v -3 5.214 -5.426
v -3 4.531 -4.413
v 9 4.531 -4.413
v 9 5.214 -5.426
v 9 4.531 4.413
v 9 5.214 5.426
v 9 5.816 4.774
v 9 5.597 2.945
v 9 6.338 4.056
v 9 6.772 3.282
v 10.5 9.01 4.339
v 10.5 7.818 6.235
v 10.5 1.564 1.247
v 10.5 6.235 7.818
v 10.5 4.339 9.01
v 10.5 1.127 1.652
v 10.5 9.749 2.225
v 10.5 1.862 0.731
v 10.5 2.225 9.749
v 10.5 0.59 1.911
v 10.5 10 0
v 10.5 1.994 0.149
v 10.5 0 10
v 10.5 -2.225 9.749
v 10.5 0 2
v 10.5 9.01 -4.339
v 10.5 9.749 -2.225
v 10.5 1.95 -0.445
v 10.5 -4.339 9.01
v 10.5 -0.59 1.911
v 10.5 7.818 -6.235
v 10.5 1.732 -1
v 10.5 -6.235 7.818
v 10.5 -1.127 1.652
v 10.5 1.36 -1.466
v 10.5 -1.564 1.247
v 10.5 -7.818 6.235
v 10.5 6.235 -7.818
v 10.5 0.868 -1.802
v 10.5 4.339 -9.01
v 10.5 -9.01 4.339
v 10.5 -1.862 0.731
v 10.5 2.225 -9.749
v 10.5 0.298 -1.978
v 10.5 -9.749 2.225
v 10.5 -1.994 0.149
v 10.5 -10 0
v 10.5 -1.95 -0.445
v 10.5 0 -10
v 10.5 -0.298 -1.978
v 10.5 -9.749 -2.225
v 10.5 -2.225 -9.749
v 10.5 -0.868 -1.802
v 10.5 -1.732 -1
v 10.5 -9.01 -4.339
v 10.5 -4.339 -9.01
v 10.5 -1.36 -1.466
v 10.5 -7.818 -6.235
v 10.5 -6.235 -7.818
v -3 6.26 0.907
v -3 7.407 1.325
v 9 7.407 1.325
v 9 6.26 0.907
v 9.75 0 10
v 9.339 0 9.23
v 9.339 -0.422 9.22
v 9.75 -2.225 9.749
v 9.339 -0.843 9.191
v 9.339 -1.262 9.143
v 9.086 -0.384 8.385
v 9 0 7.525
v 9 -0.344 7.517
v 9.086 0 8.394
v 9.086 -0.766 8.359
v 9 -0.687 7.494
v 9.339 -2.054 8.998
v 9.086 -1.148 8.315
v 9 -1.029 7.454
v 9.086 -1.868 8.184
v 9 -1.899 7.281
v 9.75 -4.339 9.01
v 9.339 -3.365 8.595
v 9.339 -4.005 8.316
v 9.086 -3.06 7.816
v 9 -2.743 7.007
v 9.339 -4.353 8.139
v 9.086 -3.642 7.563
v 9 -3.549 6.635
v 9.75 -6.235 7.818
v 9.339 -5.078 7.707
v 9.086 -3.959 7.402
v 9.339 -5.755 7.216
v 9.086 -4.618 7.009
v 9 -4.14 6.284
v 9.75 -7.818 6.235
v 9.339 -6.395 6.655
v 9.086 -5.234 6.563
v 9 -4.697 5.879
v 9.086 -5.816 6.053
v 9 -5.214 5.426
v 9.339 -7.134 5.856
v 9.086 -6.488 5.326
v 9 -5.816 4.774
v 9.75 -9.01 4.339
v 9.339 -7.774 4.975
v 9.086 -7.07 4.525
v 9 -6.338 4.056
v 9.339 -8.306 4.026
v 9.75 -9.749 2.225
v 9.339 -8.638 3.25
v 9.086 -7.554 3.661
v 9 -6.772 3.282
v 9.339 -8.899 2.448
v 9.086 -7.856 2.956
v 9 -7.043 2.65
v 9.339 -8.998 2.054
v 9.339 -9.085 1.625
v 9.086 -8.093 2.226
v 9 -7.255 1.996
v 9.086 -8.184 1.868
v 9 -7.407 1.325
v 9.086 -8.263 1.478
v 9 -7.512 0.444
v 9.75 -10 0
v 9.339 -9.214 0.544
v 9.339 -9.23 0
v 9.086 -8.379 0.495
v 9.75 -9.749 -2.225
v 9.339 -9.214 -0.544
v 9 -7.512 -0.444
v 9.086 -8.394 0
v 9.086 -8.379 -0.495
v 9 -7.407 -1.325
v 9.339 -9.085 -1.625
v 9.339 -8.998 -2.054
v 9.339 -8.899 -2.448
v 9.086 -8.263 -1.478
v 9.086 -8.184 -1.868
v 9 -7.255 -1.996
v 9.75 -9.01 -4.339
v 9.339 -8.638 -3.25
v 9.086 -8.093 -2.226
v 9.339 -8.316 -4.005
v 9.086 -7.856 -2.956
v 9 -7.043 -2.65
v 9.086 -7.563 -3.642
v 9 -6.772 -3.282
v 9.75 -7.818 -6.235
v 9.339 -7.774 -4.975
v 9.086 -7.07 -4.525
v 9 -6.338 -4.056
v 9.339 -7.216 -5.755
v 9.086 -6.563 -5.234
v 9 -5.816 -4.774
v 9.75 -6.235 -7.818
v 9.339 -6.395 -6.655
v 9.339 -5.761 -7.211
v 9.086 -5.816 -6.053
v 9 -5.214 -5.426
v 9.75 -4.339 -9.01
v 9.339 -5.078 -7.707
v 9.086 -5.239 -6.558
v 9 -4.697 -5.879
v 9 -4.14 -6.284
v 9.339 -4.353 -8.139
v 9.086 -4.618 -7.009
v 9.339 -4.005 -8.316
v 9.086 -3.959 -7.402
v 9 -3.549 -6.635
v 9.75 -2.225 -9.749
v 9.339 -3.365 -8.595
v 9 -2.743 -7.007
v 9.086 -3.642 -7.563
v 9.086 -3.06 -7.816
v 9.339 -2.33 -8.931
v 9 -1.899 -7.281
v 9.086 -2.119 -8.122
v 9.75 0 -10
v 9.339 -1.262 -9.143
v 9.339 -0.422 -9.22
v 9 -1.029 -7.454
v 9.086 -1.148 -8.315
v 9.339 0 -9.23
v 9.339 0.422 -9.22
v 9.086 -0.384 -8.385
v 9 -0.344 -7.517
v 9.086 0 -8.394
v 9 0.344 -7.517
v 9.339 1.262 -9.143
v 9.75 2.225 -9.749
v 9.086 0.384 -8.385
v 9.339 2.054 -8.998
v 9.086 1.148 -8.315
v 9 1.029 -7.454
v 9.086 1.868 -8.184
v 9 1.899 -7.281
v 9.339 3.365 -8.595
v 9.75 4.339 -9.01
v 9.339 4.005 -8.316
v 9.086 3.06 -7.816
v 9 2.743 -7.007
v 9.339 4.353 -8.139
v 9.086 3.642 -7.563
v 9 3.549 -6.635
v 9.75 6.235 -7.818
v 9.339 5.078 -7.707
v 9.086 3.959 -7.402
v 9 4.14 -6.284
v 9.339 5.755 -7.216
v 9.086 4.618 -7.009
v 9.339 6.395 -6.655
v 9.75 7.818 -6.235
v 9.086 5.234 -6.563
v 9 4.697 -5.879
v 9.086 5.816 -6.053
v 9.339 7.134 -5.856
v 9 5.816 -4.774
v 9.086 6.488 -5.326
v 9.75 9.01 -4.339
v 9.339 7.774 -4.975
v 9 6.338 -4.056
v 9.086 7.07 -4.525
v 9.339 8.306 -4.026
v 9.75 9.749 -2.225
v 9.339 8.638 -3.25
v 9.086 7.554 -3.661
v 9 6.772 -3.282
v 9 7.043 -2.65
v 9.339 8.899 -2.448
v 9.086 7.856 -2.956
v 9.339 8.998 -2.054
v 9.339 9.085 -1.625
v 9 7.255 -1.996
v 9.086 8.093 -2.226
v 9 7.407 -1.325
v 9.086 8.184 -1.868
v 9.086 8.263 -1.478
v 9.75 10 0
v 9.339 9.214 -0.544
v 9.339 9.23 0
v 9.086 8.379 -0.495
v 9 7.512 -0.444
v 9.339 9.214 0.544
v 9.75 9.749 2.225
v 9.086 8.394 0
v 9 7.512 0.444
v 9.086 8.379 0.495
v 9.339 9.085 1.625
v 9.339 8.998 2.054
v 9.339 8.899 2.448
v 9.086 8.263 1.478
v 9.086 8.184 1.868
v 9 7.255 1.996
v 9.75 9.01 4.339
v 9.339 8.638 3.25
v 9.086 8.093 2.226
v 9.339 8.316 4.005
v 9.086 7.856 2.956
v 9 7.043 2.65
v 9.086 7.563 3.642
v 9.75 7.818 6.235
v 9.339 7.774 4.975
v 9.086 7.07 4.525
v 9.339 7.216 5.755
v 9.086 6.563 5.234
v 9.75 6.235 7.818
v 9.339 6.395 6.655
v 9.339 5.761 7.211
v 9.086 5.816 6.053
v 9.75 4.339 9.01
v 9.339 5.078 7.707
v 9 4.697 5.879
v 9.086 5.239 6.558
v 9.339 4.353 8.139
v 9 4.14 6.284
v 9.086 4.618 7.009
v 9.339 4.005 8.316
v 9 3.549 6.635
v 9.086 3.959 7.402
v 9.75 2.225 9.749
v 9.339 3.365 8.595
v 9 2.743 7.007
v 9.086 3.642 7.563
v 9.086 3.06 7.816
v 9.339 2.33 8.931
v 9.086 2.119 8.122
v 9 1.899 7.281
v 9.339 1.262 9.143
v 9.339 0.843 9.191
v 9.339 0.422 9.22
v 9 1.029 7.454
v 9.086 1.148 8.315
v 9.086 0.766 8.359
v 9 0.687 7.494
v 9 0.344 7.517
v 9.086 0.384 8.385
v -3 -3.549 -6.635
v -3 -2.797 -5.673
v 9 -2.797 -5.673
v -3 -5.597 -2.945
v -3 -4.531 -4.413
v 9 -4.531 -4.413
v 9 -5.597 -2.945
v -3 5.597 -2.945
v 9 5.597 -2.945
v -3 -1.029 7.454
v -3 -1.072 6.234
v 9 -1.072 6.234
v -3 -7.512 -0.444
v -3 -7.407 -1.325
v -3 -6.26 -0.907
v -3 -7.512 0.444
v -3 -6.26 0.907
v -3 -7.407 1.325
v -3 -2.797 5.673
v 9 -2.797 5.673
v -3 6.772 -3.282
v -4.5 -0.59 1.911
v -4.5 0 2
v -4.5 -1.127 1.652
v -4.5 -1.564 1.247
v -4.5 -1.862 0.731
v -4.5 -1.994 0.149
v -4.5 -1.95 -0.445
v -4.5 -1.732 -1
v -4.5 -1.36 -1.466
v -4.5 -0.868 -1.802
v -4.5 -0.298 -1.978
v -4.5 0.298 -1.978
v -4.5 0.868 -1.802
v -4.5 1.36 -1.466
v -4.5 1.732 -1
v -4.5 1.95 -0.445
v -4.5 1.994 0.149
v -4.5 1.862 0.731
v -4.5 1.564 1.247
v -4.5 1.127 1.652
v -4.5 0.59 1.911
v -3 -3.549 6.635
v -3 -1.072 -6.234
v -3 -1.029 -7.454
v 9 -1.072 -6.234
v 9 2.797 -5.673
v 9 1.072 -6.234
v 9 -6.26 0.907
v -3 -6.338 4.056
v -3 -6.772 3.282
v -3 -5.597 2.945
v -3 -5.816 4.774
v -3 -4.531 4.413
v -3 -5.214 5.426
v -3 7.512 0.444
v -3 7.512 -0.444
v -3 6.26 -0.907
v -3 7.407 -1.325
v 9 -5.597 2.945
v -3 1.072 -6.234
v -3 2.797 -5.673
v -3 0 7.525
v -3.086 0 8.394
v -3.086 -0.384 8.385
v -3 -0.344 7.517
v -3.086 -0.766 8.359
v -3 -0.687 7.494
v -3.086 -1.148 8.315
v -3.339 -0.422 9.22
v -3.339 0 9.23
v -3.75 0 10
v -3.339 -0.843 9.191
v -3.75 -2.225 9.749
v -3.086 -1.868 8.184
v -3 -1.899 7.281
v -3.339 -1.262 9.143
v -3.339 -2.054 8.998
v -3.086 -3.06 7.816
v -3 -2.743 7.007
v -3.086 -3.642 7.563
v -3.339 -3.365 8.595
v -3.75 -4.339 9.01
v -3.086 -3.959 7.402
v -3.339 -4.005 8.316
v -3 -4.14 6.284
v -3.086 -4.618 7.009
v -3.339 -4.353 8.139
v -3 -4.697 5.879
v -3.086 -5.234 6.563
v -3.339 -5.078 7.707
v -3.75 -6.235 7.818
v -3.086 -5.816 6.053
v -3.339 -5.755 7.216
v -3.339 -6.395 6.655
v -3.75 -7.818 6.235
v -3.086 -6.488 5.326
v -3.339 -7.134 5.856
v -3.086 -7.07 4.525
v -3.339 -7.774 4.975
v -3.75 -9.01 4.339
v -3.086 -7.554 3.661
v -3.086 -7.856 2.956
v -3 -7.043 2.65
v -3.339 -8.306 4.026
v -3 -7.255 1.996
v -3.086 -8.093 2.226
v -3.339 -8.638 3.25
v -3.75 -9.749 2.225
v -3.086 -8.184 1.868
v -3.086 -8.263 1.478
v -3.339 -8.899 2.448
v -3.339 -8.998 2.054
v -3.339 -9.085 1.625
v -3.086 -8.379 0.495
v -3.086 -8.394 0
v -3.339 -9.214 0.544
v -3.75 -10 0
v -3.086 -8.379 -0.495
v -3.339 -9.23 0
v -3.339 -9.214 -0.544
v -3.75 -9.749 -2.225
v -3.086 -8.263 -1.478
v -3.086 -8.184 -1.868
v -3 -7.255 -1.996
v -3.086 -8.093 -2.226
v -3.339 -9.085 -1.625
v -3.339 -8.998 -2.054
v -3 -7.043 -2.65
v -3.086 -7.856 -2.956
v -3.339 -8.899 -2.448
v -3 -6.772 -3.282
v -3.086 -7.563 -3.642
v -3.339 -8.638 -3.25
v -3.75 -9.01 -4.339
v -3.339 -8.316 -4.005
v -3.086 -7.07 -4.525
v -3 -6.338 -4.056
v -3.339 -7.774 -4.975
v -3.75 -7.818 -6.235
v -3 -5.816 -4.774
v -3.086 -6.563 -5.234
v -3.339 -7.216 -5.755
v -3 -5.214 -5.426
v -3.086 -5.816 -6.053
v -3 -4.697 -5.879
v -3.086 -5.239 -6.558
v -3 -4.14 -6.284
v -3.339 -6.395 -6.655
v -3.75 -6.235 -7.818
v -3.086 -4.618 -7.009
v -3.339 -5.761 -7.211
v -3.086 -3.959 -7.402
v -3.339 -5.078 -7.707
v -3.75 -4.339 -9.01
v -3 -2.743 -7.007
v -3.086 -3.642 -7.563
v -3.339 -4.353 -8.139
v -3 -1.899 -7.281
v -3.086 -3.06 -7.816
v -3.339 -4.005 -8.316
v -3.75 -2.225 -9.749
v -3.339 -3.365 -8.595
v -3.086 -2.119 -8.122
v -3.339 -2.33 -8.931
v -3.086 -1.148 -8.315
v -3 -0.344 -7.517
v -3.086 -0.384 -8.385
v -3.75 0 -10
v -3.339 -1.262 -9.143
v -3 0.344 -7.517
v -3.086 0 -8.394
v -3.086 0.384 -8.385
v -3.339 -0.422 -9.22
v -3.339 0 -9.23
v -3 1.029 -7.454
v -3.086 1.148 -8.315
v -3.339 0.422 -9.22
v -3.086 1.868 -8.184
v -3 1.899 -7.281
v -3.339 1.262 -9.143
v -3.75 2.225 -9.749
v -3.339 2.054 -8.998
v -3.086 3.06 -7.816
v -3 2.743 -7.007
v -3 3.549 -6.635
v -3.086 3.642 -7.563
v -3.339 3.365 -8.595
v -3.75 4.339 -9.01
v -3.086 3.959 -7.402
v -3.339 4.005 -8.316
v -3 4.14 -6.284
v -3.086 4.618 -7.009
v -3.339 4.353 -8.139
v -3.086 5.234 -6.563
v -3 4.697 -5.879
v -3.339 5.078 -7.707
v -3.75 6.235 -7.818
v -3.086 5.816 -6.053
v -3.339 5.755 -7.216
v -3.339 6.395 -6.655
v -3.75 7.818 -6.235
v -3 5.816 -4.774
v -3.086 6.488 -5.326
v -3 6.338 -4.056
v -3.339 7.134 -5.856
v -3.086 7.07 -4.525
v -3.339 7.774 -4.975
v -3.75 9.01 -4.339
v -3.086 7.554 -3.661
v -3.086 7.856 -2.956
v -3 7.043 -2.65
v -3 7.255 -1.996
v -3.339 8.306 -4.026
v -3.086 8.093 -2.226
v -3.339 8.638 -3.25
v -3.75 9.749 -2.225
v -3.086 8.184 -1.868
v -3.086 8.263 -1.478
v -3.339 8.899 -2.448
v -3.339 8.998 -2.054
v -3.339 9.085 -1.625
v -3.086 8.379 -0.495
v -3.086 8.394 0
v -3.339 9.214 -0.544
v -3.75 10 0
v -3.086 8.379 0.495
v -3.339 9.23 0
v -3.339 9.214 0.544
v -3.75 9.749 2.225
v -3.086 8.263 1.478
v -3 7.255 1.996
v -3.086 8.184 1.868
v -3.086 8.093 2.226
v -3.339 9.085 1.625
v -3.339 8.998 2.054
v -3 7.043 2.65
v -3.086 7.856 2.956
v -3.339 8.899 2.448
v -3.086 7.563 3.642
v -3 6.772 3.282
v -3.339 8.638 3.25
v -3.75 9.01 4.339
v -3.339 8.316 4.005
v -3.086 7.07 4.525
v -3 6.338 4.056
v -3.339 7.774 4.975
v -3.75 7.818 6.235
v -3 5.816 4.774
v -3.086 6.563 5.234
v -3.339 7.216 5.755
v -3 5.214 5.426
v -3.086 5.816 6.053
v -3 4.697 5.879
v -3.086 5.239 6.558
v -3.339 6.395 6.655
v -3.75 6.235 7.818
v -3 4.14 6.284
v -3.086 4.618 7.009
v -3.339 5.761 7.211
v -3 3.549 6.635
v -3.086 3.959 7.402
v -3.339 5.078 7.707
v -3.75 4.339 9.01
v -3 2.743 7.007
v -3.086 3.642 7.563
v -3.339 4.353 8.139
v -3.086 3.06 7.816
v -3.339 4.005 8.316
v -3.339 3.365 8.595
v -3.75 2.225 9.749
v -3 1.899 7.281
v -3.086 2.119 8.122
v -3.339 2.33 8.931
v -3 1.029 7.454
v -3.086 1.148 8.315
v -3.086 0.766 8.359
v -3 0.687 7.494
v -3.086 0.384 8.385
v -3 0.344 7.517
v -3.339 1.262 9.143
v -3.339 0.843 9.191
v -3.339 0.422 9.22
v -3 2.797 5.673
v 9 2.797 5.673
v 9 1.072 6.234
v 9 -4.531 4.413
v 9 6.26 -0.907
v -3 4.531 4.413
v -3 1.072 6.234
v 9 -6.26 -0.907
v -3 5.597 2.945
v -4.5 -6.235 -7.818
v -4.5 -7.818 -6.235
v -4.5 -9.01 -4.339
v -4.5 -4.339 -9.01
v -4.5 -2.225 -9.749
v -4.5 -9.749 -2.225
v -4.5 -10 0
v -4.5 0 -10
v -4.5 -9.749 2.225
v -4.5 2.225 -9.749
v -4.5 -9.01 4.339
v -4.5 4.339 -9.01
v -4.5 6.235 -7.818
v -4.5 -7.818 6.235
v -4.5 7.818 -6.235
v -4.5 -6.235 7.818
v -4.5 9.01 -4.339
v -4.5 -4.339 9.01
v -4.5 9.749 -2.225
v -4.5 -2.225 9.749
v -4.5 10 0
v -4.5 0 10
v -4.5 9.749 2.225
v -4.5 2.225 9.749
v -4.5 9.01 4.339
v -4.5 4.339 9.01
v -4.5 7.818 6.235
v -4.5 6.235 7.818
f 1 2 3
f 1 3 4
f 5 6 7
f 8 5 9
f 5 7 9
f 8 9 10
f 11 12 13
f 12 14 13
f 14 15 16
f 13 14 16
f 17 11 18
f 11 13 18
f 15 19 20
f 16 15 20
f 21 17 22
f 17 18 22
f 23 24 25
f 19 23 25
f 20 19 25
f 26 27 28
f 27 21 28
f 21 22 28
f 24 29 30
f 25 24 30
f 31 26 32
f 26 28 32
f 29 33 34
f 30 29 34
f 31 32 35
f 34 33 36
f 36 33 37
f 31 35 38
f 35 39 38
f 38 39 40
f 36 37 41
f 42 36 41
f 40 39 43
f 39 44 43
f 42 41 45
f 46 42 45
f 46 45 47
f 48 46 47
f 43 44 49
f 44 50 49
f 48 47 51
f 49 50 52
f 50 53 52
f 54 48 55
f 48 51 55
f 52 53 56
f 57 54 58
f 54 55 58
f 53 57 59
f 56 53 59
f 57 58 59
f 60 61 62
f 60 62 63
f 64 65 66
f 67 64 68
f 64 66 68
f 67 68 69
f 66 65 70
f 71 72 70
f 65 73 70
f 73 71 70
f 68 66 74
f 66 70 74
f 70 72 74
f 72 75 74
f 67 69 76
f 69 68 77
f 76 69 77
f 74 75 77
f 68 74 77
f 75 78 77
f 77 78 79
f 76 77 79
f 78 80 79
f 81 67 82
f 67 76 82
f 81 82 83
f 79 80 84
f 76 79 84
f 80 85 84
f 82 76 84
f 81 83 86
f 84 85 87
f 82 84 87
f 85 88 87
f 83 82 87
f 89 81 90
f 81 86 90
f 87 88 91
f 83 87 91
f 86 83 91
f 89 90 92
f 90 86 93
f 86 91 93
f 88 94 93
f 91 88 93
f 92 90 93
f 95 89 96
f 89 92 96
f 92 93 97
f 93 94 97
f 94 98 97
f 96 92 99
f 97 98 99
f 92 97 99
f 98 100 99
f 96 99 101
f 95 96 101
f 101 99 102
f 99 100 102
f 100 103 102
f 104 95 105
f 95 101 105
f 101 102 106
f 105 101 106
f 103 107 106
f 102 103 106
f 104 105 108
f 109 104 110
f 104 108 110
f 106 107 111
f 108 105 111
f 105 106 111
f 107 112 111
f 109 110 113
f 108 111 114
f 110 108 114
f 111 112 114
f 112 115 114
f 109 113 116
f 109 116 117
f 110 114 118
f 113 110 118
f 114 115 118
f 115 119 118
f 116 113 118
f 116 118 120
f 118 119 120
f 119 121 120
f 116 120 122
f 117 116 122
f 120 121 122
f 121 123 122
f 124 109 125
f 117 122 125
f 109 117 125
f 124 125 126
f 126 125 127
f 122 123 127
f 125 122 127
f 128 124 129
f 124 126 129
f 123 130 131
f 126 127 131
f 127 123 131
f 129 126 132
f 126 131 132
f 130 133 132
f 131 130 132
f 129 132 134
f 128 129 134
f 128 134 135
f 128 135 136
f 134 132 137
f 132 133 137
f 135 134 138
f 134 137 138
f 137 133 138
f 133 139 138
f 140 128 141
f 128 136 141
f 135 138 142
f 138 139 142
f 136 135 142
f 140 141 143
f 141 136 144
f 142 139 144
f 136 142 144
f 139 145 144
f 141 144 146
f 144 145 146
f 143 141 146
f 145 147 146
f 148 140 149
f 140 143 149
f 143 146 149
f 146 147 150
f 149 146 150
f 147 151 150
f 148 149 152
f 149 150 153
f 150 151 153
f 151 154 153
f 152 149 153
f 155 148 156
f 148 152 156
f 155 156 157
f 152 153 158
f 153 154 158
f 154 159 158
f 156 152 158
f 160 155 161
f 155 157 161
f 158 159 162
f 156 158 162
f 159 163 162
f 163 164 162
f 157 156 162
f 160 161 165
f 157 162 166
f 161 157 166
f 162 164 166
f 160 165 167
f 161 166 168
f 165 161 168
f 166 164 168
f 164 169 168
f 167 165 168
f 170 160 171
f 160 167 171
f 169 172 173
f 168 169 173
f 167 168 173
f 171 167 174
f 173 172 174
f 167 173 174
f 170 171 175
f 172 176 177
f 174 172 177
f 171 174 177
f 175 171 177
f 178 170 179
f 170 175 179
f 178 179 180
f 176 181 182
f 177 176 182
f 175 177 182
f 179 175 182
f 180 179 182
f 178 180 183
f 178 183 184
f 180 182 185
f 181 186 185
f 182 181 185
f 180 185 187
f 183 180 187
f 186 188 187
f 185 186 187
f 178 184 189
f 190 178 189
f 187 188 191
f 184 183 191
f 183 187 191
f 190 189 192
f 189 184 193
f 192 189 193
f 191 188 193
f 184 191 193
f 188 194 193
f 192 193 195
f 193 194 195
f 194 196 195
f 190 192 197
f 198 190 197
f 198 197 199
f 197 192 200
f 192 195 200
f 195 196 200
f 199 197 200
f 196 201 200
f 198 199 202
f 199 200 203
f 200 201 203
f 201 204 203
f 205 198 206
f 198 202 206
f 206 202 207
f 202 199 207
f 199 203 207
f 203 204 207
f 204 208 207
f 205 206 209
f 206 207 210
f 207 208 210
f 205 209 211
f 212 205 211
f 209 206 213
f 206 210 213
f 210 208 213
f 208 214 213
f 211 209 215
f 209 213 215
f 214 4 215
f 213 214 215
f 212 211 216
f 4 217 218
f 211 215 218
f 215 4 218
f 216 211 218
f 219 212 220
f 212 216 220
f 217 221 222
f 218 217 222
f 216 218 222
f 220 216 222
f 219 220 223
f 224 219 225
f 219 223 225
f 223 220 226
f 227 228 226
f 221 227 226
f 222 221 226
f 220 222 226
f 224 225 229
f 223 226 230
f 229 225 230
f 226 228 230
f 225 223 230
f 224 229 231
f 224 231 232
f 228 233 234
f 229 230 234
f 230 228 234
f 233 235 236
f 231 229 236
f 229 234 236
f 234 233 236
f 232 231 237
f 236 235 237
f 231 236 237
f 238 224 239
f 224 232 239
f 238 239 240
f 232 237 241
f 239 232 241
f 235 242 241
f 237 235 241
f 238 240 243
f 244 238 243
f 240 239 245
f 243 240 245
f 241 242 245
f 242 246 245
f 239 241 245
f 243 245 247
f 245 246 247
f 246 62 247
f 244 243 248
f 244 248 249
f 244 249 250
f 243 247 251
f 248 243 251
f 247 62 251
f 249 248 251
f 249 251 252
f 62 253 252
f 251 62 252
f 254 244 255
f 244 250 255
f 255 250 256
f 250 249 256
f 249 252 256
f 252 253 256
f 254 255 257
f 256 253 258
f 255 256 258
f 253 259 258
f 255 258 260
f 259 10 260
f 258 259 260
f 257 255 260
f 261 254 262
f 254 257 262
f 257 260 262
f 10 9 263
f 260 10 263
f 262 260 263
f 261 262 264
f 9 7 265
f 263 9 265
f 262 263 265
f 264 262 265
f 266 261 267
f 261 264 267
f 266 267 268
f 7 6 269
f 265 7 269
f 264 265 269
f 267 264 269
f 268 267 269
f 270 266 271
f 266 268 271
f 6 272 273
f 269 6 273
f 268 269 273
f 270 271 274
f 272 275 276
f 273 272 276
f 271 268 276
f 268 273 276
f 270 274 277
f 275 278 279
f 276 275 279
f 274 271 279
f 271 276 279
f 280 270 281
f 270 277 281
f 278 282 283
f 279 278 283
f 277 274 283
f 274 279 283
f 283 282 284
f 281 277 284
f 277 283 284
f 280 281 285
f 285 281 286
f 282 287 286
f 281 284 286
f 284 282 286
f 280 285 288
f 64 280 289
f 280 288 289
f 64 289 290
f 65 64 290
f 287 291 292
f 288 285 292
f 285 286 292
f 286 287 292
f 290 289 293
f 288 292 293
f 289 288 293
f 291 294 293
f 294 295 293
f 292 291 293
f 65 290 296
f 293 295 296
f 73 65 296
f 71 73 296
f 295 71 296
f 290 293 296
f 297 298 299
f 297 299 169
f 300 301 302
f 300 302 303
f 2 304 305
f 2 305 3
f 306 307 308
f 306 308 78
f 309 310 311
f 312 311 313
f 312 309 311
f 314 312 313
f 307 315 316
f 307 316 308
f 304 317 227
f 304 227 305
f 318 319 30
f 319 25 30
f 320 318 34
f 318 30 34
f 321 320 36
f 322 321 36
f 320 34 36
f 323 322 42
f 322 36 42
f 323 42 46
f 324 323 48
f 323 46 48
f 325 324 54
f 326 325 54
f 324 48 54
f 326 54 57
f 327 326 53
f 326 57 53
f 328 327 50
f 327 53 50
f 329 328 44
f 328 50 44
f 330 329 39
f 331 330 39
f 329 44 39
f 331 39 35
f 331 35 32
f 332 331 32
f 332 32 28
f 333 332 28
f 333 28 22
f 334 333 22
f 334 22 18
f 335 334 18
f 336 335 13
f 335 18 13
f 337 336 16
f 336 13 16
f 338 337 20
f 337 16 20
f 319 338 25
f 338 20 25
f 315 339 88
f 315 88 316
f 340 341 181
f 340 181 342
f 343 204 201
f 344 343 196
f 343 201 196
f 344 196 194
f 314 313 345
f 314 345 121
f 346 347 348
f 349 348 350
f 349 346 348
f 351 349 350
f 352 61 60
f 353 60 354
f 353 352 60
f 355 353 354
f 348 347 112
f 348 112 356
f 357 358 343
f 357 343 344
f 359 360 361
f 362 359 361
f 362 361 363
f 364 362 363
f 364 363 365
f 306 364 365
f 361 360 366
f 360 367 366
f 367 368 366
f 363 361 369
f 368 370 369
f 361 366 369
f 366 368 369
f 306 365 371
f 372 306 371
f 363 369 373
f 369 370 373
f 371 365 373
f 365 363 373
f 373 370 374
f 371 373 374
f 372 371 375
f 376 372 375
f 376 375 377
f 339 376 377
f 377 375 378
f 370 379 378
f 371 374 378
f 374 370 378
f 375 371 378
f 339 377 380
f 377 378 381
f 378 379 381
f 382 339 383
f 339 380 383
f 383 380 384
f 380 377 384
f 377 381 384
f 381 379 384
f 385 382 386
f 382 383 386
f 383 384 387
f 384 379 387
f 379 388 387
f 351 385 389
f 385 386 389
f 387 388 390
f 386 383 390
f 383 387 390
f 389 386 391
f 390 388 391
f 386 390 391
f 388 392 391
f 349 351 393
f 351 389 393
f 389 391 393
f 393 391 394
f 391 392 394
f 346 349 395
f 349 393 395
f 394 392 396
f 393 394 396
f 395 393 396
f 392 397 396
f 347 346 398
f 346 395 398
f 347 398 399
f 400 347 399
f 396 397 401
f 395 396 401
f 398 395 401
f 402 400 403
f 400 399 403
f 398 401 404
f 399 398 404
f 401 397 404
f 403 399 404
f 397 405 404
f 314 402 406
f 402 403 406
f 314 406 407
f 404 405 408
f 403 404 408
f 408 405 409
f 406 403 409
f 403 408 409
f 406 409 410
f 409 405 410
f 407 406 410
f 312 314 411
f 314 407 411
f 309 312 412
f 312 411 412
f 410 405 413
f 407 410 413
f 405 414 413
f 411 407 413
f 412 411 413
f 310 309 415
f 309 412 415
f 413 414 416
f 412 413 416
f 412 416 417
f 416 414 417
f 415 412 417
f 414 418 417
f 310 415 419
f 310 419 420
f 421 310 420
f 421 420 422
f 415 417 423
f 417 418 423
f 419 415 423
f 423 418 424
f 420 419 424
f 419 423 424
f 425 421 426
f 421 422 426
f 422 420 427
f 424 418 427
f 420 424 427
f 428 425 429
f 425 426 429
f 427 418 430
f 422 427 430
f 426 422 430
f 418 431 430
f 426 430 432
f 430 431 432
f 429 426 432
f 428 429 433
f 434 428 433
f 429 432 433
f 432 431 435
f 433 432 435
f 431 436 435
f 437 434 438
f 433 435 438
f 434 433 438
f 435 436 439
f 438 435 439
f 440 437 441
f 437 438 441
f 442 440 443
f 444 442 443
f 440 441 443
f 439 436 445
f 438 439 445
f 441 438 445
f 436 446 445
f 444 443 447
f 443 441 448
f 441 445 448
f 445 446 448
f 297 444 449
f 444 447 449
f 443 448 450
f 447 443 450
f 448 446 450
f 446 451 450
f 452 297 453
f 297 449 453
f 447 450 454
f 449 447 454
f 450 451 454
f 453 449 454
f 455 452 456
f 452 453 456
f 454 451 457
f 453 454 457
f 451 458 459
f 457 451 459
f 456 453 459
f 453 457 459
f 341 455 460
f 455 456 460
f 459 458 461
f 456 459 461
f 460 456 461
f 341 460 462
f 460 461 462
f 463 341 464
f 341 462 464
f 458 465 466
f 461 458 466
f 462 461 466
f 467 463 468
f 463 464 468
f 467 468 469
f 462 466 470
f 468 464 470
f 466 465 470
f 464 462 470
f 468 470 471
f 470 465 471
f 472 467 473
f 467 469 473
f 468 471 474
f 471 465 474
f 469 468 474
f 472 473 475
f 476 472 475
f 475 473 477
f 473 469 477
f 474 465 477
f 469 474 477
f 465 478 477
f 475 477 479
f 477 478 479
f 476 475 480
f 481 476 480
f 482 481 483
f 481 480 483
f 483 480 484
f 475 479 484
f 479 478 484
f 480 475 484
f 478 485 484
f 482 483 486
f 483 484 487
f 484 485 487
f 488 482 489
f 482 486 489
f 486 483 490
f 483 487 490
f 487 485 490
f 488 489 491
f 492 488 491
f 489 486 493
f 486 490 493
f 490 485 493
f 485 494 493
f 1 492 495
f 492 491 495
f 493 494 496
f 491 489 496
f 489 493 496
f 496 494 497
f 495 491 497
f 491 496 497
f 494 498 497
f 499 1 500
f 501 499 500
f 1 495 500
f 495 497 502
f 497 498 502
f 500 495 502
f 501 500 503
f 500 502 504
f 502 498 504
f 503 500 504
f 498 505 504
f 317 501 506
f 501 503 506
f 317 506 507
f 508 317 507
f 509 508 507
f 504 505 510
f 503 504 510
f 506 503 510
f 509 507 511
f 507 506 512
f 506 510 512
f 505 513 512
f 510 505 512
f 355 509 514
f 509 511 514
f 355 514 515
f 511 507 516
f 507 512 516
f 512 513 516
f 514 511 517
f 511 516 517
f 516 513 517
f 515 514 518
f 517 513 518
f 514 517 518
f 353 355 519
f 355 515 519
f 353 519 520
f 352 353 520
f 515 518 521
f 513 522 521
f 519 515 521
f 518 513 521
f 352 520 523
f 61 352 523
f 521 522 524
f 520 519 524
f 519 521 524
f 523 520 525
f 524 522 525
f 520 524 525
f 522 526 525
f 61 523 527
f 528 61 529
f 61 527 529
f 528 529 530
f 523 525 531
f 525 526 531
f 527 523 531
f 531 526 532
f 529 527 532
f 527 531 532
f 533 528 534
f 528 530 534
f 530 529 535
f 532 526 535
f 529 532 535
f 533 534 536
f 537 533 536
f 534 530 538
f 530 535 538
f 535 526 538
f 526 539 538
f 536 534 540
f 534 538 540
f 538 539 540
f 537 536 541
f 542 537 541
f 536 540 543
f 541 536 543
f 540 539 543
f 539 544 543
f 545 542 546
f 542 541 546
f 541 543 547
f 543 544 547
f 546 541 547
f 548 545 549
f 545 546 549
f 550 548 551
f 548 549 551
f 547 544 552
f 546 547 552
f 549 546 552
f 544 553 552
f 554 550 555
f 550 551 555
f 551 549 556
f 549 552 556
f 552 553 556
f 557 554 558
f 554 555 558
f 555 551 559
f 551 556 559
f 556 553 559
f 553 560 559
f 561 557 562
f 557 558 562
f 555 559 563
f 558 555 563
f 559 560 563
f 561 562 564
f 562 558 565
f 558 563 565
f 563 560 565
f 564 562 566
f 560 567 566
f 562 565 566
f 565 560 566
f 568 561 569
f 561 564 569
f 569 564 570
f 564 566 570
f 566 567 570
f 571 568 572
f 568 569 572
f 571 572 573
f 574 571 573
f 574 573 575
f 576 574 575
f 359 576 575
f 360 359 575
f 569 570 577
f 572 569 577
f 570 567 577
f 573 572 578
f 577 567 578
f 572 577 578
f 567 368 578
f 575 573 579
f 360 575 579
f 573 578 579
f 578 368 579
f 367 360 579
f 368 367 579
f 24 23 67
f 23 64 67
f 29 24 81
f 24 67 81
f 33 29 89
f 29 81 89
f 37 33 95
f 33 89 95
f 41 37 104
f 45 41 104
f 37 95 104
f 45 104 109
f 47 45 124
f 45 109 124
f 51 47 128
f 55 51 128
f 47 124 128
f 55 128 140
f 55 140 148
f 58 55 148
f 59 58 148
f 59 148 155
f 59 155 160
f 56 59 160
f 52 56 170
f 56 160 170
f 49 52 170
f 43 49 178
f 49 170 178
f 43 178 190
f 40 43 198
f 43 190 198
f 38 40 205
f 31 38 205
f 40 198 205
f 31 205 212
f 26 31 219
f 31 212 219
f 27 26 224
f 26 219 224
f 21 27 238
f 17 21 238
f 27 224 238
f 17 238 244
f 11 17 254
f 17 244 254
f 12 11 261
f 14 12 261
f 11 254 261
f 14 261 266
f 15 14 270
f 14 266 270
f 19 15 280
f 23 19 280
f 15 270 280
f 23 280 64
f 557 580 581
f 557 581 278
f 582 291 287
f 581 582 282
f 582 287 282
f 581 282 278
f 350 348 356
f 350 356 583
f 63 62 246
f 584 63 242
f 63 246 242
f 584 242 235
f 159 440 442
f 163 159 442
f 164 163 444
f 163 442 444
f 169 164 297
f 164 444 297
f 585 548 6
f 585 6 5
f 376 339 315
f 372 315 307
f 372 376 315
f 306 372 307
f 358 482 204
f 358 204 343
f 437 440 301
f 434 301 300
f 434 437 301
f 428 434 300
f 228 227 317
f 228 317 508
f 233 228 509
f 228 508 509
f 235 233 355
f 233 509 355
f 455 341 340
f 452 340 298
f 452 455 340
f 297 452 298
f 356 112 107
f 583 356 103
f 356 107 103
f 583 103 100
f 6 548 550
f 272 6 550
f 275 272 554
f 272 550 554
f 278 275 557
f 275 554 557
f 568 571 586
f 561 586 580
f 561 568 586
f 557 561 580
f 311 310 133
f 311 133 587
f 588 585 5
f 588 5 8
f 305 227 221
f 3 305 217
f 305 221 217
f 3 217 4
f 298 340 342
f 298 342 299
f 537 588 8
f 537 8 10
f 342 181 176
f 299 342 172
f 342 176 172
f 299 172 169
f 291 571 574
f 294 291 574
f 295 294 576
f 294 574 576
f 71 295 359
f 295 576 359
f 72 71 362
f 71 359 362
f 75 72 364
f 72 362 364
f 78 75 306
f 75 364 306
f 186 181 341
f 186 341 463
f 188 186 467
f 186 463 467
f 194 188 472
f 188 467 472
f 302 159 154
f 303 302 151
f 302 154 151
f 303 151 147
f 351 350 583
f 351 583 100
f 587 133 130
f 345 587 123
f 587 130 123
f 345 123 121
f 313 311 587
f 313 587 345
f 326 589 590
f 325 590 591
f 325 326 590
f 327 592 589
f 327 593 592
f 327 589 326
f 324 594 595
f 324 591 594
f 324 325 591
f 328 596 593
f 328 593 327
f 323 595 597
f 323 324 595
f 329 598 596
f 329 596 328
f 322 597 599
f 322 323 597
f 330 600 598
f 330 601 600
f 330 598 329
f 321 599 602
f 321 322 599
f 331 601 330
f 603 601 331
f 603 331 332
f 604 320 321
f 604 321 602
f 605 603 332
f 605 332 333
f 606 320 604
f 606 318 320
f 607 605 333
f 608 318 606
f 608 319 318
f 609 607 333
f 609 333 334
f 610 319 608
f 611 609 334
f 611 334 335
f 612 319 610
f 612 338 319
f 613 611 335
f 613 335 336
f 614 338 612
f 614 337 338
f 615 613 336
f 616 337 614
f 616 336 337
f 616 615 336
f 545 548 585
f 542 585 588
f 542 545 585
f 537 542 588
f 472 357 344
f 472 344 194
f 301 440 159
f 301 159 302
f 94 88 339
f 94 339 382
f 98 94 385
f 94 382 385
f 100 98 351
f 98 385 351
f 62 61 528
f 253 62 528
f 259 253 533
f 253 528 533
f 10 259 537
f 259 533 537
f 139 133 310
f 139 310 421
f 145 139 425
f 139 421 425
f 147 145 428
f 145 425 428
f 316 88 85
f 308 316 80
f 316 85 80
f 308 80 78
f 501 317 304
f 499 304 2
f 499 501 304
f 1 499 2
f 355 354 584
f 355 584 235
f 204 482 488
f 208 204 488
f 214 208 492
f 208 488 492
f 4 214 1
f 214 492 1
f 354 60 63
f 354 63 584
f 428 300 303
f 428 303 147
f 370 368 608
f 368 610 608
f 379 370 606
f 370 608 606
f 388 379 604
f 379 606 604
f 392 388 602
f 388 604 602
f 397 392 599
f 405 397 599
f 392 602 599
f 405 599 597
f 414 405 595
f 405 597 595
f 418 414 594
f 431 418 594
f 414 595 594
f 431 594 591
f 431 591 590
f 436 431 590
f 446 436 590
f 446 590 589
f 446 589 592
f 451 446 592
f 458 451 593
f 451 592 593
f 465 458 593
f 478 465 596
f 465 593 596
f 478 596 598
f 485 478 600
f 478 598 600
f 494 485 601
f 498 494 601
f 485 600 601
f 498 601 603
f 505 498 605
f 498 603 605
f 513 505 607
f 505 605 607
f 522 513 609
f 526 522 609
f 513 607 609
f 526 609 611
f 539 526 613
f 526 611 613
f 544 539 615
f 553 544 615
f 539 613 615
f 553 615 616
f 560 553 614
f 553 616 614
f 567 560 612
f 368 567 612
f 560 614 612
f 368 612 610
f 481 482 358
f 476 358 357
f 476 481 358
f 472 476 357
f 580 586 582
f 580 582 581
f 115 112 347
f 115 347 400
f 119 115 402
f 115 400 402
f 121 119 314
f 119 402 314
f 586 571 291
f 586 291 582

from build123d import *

# Parameters (mm, degrees)
CUT_EXTRUDE1_START = -3
CUT_EXTRUDE1_DEPTH = 12
CIRPATTERN1_COUNT  = 10
SKETCH6_R          = 4
CUT_EXTRUDE2_DEPTH = 6


with BuildPart() as part:
    # Sketch1 → Revolve1 (revolve)
    with BuildSketch(Plane.XY, mode=Mode.PRIVATE) as revolve1_sk:
        with BuildLine():
            Line((-10.5, 2), (10.5, 2))
            Line((10.5, 2), (10.5, 10))
            Line((10.5, 10), (9.75, 10))
            ThreePointArc((9.75, 10), (9.191617437, 8.818070474), (9, 7.525))
            Line((9, 7.525), (-3, 7.525))
            ThreePointArc((-3, 7.525), (-3.191617437, 8.818070474), (-3.75, 10))
            Line((-3.75, 10), (-4.5, 10))
            Line((-4.5, 10), (-4.5, 4))
            Line((-4.5, 4), (-10.5, 4))
            Line((-10.5, 4), (-10.5, 2))
        make_face()
    revolve(revolve1_sk.sketch.rotate(Axis((-10.5, 0, 0), (1, 0, 0)), 90), axis=Axis((-10.5, 0, 0), (1, 0, 0)))

    # Sketch3 → Cut-Extrude1 (cut)
    with BuildSketch(Plane(origin=(0, 0, 0), x_dir=(0, 0, -1), z_dir=(1, 0, 0)).offset(CUT_EXTRUDE1_START)):
        with BuildLine():
            Line((-1.325, 7.407428704), (-0.907223869, 6.259598218))
            Line((-0.907223869, 6.259598218), (0.907223869, 6.259598218))
            Line((0.907223869, 6.259598218), (1.325, 7.407428704))
            ThreePointArc((1.325, 7.407428704), (0, 7.525), (-1.325, 7.407428704))
        make_face()
    cut_extrude1 = extrude(amount=CUT_EXTRUDE1_DEPTH, mode=Mode.SUBTRACT)

    # CirPattern1: Cut-Extrude1 ×10 about axis
    cirpattern1_axis = Axis((0, 0, 0), (1, 0, 0))
    for i in range(1, CIRPATTERN1_COUNT):
        add(cut_extrude1.rotate(cirpattern1_axis, i * 360 / CIRPATTERN1_COUNT), mode=Mode.SUBTRACT)

    # Sketch6 → Cut-Extrude2 (cut)
    with BuildSketch(Plane.ZY.offset(10.5)):
        Circle(SKETCH6_R)
    extrude(amount=-CUT_EXTRUDE2_DEPTH, mode=Mode.SUBTRACT)


solid = part.part
